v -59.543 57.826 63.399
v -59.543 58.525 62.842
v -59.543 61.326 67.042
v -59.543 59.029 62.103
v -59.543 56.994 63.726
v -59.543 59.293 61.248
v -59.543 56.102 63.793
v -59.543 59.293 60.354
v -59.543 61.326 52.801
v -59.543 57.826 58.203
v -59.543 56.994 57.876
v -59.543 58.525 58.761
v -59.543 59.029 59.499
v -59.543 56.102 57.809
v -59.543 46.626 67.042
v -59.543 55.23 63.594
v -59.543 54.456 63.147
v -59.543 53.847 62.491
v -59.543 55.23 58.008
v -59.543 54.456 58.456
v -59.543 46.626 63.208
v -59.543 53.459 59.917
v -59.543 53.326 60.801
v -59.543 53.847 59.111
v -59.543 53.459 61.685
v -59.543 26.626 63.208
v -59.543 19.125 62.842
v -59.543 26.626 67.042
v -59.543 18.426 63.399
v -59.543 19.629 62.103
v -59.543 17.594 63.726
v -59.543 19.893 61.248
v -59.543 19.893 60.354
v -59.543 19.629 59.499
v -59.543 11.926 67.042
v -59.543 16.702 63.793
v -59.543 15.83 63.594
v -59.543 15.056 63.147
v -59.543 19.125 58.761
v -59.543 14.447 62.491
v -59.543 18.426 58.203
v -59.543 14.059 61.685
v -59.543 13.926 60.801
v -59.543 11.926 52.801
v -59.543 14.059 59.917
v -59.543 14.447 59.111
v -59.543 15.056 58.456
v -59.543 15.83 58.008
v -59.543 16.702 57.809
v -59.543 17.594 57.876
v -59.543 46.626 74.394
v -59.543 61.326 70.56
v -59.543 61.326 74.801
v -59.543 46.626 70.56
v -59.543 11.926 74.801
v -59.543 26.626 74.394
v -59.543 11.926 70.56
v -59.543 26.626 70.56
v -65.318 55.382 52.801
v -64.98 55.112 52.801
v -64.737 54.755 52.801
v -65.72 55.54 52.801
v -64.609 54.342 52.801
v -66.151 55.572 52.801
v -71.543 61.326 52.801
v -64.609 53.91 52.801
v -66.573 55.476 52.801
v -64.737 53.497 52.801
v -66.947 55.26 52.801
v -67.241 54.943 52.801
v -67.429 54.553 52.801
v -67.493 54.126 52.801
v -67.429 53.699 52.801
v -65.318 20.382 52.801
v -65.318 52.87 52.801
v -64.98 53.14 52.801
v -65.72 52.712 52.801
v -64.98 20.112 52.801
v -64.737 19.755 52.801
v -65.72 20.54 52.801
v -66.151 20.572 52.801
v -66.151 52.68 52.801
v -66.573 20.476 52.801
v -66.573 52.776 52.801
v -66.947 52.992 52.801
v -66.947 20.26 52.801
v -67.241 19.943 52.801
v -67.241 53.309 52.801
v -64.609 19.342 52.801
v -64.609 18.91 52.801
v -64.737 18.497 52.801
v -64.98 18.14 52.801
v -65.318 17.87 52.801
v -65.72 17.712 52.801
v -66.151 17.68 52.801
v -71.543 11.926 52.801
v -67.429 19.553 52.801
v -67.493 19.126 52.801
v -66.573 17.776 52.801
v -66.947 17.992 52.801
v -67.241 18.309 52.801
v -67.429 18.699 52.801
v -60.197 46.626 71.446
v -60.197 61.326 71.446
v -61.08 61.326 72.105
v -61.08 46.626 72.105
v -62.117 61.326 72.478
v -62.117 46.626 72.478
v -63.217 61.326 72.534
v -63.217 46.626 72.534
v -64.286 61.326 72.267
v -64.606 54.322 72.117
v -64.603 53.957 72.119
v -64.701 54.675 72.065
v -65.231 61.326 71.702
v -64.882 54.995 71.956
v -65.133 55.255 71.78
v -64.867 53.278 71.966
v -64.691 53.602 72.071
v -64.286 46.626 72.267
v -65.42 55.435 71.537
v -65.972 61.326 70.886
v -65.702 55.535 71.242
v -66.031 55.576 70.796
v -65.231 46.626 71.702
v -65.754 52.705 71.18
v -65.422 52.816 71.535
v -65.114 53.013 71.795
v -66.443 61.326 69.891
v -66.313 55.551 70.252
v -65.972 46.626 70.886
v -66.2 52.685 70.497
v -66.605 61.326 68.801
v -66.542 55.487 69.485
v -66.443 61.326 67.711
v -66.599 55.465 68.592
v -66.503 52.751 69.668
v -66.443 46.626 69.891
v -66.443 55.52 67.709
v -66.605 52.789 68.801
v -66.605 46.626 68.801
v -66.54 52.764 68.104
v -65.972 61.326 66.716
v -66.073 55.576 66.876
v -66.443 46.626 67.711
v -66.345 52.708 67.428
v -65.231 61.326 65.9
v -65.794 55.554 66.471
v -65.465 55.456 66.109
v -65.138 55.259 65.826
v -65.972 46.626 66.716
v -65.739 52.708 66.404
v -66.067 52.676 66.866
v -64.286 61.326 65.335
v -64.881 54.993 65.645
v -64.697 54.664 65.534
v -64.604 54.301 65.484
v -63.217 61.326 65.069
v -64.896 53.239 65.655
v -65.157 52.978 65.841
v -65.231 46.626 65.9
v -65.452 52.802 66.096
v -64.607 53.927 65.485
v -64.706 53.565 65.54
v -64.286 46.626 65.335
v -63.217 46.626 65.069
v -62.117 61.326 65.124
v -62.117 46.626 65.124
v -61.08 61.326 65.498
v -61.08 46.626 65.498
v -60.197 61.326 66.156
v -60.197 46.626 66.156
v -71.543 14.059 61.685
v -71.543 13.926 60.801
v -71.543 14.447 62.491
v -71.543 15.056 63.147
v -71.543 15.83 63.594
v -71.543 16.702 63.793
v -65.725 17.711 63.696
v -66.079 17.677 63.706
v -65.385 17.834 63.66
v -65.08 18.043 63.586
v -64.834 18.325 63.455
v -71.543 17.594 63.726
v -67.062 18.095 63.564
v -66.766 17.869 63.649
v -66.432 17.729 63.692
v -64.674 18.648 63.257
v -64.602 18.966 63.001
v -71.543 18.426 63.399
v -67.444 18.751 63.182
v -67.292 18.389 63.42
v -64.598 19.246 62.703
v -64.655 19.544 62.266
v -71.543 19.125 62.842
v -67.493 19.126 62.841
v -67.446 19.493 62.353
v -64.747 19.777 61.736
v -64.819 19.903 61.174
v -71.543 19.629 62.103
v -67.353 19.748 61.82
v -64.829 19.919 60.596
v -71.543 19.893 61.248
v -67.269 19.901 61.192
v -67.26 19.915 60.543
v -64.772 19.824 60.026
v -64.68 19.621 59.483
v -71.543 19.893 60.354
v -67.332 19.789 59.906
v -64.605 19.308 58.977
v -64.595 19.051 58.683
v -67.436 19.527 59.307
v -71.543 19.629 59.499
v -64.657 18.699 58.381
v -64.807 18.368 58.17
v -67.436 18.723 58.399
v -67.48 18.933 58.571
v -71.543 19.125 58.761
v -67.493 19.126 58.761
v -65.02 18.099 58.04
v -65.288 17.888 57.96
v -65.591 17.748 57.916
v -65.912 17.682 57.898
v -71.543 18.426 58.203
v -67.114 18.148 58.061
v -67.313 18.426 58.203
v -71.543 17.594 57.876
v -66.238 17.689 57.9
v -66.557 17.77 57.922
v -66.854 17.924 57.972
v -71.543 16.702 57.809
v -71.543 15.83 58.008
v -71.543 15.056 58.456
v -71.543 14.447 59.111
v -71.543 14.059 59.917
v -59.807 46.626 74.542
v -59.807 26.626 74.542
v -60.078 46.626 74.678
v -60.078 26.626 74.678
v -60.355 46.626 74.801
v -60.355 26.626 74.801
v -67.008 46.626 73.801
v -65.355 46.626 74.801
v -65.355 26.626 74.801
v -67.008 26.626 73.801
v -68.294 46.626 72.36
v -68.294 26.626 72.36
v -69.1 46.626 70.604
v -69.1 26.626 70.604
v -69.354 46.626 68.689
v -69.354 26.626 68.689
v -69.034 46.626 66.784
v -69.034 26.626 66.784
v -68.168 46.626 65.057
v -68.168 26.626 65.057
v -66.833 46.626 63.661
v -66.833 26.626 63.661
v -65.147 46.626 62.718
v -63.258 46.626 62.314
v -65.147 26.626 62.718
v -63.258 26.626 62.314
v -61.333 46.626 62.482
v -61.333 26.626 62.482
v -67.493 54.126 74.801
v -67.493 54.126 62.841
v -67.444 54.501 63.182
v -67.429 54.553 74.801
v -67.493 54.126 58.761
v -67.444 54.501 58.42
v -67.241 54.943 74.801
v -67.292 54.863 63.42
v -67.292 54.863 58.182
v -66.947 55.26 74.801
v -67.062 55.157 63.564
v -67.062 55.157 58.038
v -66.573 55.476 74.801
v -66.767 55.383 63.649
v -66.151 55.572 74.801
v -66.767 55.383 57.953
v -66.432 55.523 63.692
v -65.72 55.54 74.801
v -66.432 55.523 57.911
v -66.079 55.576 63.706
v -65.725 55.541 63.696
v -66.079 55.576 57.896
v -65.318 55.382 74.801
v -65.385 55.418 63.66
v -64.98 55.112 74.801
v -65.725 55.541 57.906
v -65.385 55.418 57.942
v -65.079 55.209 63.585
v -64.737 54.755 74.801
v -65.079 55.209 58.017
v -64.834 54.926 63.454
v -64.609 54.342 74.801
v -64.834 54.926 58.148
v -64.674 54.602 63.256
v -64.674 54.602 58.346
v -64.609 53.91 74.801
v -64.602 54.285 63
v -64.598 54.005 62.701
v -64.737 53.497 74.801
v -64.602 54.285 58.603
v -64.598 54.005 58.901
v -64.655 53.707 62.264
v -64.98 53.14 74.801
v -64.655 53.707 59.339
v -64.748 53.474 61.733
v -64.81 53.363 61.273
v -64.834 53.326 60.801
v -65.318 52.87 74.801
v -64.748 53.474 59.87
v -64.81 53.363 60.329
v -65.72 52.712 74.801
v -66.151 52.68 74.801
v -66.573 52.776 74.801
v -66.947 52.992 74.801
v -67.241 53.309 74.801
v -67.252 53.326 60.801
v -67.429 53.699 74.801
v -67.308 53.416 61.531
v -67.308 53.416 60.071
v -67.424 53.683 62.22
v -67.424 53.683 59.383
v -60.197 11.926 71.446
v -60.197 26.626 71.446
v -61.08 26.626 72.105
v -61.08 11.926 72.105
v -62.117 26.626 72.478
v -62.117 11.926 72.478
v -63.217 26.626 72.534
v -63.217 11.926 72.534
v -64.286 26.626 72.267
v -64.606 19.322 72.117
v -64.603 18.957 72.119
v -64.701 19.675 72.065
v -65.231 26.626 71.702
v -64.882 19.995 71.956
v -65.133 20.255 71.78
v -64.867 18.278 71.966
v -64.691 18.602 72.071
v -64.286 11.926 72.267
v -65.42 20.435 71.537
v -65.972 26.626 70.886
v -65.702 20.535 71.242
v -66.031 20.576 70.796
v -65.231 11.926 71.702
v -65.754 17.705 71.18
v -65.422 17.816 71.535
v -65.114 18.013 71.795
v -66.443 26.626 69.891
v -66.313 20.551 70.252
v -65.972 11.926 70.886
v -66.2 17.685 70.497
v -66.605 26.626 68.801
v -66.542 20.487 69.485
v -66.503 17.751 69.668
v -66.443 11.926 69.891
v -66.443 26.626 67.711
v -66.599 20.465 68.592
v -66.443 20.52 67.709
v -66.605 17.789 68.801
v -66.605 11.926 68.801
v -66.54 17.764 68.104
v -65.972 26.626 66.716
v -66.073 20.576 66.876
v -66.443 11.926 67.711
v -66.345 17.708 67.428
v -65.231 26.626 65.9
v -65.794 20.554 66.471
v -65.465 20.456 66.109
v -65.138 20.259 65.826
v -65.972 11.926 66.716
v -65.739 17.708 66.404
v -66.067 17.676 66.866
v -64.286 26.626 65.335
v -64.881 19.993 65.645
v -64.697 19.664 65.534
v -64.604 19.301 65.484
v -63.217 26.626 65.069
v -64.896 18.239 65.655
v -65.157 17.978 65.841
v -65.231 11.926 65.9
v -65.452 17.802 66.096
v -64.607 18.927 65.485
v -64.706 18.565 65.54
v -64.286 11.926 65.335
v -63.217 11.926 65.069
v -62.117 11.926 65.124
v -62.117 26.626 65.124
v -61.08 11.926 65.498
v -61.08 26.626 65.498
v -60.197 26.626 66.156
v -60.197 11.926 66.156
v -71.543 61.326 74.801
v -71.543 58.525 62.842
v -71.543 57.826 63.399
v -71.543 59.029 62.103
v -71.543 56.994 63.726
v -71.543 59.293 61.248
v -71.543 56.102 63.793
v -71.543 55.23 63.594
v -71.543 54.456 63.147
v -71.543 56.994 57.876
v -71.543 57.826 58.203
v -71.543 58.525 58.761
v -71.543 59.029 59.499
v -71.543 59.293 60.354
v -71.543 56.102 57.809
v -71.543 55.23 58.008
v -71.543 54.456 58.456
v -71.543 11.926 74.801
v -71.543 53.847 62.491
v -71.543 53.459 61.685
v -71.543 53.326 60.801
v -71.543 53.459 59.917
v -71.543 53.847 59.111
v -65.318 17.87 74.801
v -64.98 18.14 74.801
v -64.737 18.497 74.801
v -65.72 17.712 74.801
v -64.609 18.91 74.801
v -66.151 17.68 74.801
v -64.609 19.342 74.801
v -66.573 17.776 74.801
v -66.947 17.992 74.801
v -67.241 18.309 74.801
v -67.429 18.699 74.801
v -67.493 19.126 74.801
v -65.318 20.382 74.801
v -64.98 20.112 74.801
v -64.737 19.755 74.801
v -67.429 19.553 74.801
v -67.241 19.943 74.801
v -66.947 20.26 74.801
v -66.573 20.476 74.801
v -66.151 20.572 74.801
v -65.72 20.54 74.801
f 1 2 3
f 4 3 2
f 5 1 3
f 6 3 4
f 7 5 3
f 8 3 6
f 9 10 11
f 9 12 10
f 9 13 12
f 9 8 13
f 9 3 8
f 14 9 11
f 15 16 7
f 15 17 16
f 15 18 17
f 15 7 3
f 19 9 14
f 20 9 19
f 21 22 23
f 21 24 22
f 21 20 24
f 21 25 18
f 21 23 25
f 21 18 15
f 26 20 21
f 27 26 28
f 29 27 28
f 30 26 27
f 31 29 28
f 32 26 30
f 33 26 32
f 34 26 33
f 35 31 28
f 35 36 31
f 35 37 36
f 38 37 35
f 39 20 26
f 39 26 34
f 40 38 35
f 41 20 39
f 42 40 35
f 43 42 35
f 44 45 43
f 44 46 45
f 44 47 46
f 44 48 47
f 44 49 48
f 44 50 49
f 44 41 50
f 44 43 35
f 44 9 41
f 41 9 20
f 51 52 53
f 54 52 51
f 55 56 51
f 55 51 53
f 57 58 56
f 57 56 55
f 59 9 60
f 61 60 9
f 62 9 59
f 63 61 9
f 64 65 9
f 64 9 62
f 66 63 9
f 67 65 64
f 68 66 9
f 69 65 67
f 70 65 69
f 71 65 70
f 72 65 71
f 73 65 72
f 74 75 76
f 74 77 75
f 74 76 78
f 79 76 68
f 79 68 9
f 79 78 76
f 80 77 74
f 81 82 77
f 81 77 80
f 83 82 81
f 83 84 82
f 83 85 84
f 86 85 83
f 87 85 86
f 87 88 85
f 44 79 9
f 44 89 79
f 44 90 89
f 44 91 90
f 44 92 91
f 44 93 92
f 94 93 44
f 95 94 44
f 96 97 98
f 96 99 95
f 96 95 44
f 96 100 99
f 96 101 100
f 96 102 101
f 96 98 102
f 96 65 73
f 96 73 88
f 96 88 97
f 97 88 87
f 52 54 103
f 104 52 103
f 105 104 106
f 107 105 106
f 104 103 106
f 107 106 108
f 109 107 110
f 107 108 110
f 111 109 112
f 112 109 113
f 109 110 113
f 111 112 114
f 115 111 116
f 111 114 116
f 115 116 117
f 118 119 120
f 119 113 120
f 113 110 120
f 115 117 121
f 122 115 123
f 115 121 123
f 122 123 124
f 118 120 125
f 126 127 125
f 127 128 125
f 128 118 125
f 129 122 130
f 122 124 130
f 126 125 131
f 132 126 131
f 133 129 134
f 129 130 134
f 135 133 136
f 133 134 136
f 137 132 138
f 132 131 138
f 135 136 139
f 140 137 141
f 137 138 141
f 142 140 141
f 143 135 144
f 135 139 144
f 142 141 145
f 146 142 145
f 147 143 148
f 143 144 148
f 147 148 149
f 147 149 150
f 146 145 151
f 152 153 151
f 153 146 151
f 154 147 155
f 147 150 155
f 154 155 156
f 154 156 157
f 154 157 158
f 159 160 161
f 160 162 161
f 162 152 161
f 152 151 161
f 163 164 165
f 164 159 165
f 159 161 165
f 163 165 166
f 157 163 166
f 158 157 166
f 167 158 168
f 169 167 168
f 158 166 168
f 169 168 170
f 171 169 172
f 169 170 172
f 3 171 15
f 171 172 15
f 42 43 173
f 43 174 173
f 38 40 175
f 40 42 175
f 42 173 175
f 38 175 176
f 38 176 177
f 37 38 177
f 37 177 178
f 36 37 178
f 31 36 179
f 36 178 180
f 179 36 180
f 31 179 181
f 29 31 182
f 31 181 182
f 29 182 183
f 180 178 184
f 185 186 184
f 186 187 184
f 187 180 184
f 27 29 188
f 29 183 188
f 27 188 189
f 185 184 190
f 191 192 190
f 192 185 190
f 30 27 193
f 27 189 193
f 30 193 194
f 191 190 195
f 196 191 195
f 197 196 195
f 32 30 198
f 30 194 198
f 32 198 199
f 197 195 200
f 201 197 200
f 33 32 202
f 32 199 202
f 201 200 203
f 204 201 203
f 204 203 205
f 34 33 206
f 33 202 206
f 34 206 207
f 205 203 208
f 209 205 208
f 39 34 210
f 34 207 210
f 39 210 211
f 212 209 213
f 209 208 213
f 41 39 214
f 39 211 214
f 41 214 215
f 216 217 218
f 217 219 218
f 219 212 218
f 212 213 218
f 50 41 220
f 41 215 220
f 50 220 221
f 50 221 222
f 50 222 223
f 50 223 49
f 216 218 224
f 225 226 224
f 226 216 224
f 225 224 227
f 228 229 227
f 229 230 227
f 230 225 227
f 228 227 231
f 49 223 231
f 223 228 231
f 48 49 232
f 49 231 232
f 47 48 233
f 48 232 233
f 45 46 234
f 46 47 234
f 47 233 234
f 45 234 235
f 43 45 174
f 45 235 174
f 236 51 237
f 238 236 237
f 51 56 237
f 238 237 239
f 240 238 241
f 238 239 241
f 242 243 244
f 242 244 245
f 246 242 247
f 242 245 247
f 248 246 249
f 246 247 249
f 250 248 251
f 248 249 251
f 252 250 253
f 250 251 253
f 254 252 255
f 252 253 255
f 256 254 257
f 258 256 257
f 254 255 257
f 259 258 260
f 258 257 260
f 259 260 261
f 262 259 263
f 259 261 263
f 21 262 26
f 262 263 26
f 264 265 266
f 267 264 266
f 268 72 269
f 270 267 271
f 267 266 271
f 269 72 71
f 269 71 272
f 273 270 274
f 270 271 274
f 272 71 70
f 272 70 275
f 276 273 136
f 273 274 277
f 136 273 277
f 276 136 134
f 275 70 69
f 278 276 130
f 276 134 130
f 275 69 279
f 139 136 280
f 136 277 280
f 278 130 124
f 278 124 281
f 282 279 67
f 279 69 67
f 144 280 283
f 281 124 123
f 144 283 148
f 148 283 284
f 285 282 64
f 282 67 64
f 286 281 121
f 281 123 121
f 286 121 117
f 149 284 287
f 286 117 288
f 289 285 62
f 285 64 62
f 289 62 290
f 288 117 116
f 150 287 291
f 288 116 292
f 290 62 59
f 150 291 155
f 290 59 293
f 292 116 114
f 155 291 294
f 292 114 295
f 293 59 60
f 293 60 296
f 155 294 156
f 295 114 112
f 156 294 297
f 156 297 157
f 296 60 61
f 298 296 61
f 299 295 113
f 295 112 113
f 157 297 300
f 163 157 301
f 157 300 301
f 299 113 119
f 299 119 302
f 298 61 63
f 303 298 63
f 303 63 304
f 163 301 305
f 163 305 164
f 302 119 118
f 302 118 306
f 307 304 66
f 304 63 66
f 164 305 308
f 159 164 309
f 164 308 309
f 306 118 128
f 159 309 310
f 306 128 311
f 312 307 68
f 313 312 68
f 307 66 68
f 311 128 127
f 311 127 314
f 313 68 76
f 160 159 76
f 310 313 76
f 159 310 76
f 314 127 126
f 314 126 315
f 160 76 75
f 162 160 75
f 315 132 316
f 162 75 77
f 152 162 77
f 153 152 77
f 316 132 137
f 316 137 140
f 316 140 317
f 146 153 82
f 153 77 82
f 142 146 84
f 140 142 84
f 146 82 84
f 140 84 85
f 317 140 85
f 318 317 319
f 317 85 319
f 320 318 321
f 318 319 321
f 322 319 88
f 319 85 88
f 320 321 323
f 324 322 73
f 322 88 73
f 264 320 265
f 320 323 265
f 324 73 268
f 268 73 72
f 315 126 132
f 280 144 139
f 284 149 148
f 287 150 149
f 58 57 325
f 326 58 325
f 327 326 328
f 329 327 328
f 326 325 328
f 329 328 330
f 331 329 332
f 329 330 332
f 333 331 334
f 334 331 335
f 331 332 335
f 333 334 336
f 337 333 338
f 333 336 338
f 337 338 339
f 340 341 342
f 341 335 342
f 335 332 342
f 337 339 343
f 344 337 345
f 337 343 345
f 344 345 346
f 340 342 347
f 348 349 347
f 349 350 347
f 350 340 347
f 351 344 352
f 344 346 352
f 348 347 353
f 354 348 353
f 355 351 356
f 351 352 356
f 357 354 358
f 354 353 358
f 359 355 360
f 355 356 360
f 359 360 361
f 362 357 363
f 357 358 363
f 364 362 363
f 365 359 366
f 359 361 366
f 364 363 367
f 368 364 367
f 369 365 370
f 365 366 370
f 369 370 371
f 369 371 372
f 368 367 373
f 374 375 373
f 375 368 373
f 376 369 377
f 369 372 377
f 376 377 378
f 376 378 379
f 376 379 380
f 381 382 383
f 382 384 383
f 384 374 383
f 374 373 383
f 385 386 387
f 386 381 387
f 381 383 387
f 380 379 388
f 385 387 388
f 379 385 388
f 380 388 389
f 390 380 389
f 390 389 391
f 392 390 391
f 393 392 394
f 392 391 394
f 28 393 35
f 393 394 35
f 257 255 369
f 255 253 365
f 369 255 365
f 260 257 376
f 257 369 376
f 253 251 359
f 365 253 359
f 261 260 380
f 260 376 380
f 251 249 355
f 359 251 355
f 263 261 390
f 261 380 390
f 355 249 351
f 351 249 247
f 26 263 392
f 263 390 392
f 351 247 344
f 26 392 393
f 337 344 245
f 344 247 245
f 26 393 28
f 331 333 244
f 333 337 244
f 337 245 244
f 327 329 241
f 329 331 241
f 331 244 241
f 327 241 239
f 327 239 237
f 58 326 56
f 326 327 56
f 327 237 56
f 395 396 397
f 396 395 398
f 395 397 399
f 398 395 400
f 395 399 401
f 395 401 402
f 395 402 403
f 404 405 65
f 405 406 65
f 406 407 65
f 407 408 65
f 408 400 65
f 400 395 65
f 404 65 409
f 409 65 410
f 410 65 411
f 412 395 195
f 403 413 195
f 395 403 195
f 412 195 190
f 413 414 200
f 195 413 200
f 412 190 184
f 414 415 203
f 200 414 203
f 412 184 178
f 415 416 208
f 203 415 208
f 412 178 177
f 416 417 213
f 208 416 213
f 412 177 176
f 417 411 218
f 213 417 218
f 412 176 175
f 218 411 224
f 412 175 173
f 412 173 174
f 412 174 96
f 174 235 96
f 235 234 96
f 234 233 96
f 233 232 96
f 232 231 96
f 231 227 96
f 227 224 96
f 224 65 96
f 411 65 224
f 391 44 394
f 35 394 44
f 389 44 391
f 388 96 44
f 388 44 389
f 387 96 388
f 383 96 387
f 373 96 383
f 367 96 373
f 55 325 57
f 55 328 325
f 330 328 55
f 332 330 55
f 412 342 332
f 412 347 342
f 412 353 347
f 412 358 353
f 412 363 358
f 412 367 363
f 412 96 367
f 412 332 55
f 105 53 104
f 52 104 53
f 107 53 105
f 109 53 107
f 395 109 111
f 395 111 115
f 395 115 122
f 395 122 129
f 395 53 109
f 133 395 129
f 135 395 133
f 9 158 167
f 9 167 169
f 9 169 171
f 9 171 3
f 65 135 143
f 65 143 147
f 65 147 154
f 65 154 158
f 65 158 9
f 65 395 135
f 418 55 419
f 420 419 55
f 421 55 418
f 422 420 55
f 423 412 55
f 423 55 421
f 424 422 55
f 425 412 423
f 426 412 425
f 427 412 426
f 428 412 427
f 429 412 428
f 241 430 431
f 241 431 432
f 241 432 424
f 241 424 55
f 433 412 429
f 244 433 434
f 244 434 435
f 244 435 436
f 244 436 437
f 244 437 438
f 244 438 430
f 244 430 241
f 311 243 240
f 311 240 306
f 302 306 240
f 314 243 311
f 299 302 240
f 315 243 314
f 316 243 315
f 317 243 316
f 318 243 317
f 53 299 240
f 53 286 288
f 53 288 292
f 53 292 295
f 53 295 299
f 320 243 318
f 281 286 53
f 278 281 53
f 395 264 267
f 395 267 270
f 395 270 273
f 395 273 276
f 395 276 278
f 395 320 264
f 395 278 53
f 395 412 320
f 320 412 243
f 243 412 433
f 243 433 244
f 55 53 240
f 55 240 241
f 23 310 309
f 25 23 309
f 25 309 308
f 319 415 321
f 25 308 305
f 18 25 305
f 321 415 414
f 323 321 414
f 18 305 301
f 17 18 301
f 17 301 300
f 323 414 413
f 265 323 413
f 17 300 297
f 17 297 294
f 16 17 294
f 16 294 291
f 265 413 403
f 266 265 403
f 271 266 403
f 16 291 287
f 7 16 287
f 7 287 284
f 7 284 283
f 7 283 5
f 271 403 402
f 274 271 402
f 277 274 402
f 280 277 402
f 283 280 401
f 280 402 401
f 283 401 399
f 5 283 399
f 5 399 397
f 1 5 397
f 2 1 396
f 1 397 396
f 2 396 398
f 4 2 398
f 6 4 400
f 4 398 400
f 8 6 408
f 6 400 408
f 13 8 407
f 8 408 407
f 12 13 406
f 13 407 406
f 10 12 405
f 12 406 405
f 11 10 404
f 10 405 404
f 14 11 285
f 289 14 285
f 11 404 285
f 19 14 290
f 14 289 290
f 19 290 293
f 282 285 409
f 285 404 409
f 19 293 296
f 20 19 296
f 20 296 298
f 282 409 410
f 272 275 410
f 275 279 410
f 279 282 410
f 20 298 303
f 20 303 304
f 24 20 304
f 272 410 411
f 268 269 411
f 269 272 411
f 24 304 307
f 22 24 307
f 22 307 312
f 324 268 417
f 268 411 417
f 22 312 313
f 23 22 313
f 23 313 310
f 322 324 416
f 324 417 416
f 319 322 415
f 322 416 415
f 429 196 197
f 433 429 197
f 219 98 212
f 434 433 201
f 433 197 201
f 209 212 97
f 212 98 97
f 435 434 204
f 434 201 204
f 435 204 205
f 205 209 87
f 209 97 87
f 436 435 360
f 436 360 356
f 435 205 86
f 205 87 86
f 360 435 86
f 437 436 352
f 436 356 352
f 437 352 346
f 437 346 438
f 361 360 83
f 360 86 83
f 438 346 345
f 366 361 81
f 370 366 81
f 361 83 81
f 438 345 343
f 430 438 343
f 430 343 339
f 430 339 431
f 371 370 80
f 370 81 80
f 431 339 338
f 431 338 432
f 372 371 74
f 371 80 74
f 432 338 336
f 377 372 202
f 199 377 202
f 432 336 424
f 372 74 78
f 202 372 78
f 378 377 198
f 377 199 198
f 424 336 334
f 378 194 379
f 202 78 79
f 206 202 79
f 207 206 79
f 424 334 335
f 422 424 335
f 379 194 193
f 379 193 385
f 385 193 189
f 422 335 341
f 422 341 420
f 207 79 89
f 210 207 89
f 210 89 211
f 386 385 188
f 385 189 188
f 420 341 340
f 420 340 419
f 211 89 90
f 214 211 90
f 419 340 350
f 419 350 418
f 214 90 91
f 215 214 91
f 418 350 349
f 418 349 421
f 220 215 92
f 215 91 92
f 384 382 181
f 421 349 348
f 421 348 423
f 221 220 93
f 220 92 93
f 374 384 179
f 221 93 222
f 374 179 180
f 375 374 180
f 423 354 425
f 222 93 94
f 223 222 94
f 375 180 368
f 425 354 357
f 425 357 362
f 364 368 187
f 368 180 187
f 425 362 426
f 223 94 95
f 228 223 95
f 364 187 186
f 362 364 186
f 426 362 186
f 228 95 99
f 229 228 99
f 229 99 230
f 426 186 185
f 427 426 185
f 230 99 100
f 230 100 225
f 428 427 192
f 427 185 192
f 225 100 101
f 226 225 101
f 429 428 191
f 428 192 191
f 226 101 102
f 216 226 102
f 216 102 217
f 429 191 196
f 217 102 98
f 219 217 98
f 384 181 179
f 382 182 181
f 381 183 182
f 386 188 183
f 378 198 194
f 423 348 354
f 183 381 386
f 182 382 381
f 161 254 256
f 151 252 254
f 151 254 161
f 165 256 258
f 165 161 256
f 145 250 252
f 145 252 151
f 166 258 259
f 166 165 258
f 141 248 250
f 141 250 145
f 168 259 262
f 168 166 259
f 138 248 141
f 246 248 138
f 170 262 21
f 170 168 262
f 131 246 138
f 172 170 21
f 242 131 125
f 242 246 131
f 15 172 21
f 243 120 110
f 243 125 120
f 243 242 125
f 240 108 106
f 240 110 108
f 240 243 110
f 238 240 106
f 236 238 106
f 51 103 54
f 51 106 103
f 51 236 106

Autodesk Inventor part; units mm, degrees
ref_plane "YZ Plane" through (0, 0, 0) normal (1, 0, 0) x (0, 1, 0)
ref_plane "XZ Plane" through (0, 0, 0) normal (0, 1, 0) x (-1, 0, 0)
ref_plane "XY Plane" through (0, 0, 0) normal (0, 0, 1) x (1, 0, 0)
ref_plane "Work Plane1" through (-71.5431, 15.4261, 39.8011) normal (1, 0, 0) x (0, -1, 0)
sketch "Sketch1" plane through (-71.5431, 15.4261, 39.8011) normal (1, 0, 0) x (0, -1, 0)
  circle A0 centre (-40.9, -21) radius 3 projected
  circle A1 centre (-1.5, -21) radius 3 projected
  line L0 (-45.9, -13) -> (3.5, -13)
  line L1 (3.5, -13) -> (3.5, -35)
  line L2 (3.5, -35) -> (-45.9, -35)
  line L3 (-45.9, -35) -> (-45.9, -13)
  line L4 (66.8457, -32) -> (-83.1543, -32)
  point P0 (15.4261, 39.8011)
  dimension "d0" = 5
  dimension "d1" = 8
  dimension "d2" = 5
  dimension "d3" = 3
extrude "Extrusion1" add sketch "Sketch1" along normal blind 12
sketch "Sketch2" plane through (-71.5431, 11.9261, 52.8011) normal (0, -1, 0) x (1, 0, 0)
  circle A0 centre (8.688, 16) radius 3 projected
  circle A1 centre (8.688, 16) radius 3.75
  point P0 (71.5431, -52.8011)
  dimension "d6" = 7.5
extrude "Extrusion2" cut sketch "Sketch2" against normal through all contours A0 | A1
ref_plane "Work Plane2" through (-71.5431, 36.6261, 52.8011) normal (0, -1, 0) x (1, 0, 0)
sketch "Sketch3" plane through (-71.5431, 36.6261, 52.8011) normal (0, -1, 0) x (1, 0, 0)
  circle A0 centre (8.688, 16) radius 6 projected
  circle A1 centre (8.688, 16) radius 6.5
  point P0 (71.5431, -52.8011)
  dimension "d9" = 0.5
extrude "Extrusion3" cut sketch "Sketch3" along normal mid plane 20 contours A0 | A1
sketch "Sketch5" plane through (-71.5431, 11.9261, 52.8011) normal (0, 0, -1) x (-1, 0, 0)
  circle A0 centre (-5.5, 42.2) radius 2.1 projected
  arc A1 (-5.5, 5.1) -> (-5.5, 9.3) centre (-5.5, 7.2) ccw projected
  circle A2 centre (-5.5, 42.2) radius 1.45
  circle A3 centre (-5.5, 7.2) radius 1.45
  point P0 (-71.5431, -11.9261)
  dimension "d14" = 2.9
  dimension "d15" = 2.9
extrude "Extrusion5" cut sketch "Sketch5" against normal through all contours A2 | A3
properties part number "02_Opentrons_stage_x"
